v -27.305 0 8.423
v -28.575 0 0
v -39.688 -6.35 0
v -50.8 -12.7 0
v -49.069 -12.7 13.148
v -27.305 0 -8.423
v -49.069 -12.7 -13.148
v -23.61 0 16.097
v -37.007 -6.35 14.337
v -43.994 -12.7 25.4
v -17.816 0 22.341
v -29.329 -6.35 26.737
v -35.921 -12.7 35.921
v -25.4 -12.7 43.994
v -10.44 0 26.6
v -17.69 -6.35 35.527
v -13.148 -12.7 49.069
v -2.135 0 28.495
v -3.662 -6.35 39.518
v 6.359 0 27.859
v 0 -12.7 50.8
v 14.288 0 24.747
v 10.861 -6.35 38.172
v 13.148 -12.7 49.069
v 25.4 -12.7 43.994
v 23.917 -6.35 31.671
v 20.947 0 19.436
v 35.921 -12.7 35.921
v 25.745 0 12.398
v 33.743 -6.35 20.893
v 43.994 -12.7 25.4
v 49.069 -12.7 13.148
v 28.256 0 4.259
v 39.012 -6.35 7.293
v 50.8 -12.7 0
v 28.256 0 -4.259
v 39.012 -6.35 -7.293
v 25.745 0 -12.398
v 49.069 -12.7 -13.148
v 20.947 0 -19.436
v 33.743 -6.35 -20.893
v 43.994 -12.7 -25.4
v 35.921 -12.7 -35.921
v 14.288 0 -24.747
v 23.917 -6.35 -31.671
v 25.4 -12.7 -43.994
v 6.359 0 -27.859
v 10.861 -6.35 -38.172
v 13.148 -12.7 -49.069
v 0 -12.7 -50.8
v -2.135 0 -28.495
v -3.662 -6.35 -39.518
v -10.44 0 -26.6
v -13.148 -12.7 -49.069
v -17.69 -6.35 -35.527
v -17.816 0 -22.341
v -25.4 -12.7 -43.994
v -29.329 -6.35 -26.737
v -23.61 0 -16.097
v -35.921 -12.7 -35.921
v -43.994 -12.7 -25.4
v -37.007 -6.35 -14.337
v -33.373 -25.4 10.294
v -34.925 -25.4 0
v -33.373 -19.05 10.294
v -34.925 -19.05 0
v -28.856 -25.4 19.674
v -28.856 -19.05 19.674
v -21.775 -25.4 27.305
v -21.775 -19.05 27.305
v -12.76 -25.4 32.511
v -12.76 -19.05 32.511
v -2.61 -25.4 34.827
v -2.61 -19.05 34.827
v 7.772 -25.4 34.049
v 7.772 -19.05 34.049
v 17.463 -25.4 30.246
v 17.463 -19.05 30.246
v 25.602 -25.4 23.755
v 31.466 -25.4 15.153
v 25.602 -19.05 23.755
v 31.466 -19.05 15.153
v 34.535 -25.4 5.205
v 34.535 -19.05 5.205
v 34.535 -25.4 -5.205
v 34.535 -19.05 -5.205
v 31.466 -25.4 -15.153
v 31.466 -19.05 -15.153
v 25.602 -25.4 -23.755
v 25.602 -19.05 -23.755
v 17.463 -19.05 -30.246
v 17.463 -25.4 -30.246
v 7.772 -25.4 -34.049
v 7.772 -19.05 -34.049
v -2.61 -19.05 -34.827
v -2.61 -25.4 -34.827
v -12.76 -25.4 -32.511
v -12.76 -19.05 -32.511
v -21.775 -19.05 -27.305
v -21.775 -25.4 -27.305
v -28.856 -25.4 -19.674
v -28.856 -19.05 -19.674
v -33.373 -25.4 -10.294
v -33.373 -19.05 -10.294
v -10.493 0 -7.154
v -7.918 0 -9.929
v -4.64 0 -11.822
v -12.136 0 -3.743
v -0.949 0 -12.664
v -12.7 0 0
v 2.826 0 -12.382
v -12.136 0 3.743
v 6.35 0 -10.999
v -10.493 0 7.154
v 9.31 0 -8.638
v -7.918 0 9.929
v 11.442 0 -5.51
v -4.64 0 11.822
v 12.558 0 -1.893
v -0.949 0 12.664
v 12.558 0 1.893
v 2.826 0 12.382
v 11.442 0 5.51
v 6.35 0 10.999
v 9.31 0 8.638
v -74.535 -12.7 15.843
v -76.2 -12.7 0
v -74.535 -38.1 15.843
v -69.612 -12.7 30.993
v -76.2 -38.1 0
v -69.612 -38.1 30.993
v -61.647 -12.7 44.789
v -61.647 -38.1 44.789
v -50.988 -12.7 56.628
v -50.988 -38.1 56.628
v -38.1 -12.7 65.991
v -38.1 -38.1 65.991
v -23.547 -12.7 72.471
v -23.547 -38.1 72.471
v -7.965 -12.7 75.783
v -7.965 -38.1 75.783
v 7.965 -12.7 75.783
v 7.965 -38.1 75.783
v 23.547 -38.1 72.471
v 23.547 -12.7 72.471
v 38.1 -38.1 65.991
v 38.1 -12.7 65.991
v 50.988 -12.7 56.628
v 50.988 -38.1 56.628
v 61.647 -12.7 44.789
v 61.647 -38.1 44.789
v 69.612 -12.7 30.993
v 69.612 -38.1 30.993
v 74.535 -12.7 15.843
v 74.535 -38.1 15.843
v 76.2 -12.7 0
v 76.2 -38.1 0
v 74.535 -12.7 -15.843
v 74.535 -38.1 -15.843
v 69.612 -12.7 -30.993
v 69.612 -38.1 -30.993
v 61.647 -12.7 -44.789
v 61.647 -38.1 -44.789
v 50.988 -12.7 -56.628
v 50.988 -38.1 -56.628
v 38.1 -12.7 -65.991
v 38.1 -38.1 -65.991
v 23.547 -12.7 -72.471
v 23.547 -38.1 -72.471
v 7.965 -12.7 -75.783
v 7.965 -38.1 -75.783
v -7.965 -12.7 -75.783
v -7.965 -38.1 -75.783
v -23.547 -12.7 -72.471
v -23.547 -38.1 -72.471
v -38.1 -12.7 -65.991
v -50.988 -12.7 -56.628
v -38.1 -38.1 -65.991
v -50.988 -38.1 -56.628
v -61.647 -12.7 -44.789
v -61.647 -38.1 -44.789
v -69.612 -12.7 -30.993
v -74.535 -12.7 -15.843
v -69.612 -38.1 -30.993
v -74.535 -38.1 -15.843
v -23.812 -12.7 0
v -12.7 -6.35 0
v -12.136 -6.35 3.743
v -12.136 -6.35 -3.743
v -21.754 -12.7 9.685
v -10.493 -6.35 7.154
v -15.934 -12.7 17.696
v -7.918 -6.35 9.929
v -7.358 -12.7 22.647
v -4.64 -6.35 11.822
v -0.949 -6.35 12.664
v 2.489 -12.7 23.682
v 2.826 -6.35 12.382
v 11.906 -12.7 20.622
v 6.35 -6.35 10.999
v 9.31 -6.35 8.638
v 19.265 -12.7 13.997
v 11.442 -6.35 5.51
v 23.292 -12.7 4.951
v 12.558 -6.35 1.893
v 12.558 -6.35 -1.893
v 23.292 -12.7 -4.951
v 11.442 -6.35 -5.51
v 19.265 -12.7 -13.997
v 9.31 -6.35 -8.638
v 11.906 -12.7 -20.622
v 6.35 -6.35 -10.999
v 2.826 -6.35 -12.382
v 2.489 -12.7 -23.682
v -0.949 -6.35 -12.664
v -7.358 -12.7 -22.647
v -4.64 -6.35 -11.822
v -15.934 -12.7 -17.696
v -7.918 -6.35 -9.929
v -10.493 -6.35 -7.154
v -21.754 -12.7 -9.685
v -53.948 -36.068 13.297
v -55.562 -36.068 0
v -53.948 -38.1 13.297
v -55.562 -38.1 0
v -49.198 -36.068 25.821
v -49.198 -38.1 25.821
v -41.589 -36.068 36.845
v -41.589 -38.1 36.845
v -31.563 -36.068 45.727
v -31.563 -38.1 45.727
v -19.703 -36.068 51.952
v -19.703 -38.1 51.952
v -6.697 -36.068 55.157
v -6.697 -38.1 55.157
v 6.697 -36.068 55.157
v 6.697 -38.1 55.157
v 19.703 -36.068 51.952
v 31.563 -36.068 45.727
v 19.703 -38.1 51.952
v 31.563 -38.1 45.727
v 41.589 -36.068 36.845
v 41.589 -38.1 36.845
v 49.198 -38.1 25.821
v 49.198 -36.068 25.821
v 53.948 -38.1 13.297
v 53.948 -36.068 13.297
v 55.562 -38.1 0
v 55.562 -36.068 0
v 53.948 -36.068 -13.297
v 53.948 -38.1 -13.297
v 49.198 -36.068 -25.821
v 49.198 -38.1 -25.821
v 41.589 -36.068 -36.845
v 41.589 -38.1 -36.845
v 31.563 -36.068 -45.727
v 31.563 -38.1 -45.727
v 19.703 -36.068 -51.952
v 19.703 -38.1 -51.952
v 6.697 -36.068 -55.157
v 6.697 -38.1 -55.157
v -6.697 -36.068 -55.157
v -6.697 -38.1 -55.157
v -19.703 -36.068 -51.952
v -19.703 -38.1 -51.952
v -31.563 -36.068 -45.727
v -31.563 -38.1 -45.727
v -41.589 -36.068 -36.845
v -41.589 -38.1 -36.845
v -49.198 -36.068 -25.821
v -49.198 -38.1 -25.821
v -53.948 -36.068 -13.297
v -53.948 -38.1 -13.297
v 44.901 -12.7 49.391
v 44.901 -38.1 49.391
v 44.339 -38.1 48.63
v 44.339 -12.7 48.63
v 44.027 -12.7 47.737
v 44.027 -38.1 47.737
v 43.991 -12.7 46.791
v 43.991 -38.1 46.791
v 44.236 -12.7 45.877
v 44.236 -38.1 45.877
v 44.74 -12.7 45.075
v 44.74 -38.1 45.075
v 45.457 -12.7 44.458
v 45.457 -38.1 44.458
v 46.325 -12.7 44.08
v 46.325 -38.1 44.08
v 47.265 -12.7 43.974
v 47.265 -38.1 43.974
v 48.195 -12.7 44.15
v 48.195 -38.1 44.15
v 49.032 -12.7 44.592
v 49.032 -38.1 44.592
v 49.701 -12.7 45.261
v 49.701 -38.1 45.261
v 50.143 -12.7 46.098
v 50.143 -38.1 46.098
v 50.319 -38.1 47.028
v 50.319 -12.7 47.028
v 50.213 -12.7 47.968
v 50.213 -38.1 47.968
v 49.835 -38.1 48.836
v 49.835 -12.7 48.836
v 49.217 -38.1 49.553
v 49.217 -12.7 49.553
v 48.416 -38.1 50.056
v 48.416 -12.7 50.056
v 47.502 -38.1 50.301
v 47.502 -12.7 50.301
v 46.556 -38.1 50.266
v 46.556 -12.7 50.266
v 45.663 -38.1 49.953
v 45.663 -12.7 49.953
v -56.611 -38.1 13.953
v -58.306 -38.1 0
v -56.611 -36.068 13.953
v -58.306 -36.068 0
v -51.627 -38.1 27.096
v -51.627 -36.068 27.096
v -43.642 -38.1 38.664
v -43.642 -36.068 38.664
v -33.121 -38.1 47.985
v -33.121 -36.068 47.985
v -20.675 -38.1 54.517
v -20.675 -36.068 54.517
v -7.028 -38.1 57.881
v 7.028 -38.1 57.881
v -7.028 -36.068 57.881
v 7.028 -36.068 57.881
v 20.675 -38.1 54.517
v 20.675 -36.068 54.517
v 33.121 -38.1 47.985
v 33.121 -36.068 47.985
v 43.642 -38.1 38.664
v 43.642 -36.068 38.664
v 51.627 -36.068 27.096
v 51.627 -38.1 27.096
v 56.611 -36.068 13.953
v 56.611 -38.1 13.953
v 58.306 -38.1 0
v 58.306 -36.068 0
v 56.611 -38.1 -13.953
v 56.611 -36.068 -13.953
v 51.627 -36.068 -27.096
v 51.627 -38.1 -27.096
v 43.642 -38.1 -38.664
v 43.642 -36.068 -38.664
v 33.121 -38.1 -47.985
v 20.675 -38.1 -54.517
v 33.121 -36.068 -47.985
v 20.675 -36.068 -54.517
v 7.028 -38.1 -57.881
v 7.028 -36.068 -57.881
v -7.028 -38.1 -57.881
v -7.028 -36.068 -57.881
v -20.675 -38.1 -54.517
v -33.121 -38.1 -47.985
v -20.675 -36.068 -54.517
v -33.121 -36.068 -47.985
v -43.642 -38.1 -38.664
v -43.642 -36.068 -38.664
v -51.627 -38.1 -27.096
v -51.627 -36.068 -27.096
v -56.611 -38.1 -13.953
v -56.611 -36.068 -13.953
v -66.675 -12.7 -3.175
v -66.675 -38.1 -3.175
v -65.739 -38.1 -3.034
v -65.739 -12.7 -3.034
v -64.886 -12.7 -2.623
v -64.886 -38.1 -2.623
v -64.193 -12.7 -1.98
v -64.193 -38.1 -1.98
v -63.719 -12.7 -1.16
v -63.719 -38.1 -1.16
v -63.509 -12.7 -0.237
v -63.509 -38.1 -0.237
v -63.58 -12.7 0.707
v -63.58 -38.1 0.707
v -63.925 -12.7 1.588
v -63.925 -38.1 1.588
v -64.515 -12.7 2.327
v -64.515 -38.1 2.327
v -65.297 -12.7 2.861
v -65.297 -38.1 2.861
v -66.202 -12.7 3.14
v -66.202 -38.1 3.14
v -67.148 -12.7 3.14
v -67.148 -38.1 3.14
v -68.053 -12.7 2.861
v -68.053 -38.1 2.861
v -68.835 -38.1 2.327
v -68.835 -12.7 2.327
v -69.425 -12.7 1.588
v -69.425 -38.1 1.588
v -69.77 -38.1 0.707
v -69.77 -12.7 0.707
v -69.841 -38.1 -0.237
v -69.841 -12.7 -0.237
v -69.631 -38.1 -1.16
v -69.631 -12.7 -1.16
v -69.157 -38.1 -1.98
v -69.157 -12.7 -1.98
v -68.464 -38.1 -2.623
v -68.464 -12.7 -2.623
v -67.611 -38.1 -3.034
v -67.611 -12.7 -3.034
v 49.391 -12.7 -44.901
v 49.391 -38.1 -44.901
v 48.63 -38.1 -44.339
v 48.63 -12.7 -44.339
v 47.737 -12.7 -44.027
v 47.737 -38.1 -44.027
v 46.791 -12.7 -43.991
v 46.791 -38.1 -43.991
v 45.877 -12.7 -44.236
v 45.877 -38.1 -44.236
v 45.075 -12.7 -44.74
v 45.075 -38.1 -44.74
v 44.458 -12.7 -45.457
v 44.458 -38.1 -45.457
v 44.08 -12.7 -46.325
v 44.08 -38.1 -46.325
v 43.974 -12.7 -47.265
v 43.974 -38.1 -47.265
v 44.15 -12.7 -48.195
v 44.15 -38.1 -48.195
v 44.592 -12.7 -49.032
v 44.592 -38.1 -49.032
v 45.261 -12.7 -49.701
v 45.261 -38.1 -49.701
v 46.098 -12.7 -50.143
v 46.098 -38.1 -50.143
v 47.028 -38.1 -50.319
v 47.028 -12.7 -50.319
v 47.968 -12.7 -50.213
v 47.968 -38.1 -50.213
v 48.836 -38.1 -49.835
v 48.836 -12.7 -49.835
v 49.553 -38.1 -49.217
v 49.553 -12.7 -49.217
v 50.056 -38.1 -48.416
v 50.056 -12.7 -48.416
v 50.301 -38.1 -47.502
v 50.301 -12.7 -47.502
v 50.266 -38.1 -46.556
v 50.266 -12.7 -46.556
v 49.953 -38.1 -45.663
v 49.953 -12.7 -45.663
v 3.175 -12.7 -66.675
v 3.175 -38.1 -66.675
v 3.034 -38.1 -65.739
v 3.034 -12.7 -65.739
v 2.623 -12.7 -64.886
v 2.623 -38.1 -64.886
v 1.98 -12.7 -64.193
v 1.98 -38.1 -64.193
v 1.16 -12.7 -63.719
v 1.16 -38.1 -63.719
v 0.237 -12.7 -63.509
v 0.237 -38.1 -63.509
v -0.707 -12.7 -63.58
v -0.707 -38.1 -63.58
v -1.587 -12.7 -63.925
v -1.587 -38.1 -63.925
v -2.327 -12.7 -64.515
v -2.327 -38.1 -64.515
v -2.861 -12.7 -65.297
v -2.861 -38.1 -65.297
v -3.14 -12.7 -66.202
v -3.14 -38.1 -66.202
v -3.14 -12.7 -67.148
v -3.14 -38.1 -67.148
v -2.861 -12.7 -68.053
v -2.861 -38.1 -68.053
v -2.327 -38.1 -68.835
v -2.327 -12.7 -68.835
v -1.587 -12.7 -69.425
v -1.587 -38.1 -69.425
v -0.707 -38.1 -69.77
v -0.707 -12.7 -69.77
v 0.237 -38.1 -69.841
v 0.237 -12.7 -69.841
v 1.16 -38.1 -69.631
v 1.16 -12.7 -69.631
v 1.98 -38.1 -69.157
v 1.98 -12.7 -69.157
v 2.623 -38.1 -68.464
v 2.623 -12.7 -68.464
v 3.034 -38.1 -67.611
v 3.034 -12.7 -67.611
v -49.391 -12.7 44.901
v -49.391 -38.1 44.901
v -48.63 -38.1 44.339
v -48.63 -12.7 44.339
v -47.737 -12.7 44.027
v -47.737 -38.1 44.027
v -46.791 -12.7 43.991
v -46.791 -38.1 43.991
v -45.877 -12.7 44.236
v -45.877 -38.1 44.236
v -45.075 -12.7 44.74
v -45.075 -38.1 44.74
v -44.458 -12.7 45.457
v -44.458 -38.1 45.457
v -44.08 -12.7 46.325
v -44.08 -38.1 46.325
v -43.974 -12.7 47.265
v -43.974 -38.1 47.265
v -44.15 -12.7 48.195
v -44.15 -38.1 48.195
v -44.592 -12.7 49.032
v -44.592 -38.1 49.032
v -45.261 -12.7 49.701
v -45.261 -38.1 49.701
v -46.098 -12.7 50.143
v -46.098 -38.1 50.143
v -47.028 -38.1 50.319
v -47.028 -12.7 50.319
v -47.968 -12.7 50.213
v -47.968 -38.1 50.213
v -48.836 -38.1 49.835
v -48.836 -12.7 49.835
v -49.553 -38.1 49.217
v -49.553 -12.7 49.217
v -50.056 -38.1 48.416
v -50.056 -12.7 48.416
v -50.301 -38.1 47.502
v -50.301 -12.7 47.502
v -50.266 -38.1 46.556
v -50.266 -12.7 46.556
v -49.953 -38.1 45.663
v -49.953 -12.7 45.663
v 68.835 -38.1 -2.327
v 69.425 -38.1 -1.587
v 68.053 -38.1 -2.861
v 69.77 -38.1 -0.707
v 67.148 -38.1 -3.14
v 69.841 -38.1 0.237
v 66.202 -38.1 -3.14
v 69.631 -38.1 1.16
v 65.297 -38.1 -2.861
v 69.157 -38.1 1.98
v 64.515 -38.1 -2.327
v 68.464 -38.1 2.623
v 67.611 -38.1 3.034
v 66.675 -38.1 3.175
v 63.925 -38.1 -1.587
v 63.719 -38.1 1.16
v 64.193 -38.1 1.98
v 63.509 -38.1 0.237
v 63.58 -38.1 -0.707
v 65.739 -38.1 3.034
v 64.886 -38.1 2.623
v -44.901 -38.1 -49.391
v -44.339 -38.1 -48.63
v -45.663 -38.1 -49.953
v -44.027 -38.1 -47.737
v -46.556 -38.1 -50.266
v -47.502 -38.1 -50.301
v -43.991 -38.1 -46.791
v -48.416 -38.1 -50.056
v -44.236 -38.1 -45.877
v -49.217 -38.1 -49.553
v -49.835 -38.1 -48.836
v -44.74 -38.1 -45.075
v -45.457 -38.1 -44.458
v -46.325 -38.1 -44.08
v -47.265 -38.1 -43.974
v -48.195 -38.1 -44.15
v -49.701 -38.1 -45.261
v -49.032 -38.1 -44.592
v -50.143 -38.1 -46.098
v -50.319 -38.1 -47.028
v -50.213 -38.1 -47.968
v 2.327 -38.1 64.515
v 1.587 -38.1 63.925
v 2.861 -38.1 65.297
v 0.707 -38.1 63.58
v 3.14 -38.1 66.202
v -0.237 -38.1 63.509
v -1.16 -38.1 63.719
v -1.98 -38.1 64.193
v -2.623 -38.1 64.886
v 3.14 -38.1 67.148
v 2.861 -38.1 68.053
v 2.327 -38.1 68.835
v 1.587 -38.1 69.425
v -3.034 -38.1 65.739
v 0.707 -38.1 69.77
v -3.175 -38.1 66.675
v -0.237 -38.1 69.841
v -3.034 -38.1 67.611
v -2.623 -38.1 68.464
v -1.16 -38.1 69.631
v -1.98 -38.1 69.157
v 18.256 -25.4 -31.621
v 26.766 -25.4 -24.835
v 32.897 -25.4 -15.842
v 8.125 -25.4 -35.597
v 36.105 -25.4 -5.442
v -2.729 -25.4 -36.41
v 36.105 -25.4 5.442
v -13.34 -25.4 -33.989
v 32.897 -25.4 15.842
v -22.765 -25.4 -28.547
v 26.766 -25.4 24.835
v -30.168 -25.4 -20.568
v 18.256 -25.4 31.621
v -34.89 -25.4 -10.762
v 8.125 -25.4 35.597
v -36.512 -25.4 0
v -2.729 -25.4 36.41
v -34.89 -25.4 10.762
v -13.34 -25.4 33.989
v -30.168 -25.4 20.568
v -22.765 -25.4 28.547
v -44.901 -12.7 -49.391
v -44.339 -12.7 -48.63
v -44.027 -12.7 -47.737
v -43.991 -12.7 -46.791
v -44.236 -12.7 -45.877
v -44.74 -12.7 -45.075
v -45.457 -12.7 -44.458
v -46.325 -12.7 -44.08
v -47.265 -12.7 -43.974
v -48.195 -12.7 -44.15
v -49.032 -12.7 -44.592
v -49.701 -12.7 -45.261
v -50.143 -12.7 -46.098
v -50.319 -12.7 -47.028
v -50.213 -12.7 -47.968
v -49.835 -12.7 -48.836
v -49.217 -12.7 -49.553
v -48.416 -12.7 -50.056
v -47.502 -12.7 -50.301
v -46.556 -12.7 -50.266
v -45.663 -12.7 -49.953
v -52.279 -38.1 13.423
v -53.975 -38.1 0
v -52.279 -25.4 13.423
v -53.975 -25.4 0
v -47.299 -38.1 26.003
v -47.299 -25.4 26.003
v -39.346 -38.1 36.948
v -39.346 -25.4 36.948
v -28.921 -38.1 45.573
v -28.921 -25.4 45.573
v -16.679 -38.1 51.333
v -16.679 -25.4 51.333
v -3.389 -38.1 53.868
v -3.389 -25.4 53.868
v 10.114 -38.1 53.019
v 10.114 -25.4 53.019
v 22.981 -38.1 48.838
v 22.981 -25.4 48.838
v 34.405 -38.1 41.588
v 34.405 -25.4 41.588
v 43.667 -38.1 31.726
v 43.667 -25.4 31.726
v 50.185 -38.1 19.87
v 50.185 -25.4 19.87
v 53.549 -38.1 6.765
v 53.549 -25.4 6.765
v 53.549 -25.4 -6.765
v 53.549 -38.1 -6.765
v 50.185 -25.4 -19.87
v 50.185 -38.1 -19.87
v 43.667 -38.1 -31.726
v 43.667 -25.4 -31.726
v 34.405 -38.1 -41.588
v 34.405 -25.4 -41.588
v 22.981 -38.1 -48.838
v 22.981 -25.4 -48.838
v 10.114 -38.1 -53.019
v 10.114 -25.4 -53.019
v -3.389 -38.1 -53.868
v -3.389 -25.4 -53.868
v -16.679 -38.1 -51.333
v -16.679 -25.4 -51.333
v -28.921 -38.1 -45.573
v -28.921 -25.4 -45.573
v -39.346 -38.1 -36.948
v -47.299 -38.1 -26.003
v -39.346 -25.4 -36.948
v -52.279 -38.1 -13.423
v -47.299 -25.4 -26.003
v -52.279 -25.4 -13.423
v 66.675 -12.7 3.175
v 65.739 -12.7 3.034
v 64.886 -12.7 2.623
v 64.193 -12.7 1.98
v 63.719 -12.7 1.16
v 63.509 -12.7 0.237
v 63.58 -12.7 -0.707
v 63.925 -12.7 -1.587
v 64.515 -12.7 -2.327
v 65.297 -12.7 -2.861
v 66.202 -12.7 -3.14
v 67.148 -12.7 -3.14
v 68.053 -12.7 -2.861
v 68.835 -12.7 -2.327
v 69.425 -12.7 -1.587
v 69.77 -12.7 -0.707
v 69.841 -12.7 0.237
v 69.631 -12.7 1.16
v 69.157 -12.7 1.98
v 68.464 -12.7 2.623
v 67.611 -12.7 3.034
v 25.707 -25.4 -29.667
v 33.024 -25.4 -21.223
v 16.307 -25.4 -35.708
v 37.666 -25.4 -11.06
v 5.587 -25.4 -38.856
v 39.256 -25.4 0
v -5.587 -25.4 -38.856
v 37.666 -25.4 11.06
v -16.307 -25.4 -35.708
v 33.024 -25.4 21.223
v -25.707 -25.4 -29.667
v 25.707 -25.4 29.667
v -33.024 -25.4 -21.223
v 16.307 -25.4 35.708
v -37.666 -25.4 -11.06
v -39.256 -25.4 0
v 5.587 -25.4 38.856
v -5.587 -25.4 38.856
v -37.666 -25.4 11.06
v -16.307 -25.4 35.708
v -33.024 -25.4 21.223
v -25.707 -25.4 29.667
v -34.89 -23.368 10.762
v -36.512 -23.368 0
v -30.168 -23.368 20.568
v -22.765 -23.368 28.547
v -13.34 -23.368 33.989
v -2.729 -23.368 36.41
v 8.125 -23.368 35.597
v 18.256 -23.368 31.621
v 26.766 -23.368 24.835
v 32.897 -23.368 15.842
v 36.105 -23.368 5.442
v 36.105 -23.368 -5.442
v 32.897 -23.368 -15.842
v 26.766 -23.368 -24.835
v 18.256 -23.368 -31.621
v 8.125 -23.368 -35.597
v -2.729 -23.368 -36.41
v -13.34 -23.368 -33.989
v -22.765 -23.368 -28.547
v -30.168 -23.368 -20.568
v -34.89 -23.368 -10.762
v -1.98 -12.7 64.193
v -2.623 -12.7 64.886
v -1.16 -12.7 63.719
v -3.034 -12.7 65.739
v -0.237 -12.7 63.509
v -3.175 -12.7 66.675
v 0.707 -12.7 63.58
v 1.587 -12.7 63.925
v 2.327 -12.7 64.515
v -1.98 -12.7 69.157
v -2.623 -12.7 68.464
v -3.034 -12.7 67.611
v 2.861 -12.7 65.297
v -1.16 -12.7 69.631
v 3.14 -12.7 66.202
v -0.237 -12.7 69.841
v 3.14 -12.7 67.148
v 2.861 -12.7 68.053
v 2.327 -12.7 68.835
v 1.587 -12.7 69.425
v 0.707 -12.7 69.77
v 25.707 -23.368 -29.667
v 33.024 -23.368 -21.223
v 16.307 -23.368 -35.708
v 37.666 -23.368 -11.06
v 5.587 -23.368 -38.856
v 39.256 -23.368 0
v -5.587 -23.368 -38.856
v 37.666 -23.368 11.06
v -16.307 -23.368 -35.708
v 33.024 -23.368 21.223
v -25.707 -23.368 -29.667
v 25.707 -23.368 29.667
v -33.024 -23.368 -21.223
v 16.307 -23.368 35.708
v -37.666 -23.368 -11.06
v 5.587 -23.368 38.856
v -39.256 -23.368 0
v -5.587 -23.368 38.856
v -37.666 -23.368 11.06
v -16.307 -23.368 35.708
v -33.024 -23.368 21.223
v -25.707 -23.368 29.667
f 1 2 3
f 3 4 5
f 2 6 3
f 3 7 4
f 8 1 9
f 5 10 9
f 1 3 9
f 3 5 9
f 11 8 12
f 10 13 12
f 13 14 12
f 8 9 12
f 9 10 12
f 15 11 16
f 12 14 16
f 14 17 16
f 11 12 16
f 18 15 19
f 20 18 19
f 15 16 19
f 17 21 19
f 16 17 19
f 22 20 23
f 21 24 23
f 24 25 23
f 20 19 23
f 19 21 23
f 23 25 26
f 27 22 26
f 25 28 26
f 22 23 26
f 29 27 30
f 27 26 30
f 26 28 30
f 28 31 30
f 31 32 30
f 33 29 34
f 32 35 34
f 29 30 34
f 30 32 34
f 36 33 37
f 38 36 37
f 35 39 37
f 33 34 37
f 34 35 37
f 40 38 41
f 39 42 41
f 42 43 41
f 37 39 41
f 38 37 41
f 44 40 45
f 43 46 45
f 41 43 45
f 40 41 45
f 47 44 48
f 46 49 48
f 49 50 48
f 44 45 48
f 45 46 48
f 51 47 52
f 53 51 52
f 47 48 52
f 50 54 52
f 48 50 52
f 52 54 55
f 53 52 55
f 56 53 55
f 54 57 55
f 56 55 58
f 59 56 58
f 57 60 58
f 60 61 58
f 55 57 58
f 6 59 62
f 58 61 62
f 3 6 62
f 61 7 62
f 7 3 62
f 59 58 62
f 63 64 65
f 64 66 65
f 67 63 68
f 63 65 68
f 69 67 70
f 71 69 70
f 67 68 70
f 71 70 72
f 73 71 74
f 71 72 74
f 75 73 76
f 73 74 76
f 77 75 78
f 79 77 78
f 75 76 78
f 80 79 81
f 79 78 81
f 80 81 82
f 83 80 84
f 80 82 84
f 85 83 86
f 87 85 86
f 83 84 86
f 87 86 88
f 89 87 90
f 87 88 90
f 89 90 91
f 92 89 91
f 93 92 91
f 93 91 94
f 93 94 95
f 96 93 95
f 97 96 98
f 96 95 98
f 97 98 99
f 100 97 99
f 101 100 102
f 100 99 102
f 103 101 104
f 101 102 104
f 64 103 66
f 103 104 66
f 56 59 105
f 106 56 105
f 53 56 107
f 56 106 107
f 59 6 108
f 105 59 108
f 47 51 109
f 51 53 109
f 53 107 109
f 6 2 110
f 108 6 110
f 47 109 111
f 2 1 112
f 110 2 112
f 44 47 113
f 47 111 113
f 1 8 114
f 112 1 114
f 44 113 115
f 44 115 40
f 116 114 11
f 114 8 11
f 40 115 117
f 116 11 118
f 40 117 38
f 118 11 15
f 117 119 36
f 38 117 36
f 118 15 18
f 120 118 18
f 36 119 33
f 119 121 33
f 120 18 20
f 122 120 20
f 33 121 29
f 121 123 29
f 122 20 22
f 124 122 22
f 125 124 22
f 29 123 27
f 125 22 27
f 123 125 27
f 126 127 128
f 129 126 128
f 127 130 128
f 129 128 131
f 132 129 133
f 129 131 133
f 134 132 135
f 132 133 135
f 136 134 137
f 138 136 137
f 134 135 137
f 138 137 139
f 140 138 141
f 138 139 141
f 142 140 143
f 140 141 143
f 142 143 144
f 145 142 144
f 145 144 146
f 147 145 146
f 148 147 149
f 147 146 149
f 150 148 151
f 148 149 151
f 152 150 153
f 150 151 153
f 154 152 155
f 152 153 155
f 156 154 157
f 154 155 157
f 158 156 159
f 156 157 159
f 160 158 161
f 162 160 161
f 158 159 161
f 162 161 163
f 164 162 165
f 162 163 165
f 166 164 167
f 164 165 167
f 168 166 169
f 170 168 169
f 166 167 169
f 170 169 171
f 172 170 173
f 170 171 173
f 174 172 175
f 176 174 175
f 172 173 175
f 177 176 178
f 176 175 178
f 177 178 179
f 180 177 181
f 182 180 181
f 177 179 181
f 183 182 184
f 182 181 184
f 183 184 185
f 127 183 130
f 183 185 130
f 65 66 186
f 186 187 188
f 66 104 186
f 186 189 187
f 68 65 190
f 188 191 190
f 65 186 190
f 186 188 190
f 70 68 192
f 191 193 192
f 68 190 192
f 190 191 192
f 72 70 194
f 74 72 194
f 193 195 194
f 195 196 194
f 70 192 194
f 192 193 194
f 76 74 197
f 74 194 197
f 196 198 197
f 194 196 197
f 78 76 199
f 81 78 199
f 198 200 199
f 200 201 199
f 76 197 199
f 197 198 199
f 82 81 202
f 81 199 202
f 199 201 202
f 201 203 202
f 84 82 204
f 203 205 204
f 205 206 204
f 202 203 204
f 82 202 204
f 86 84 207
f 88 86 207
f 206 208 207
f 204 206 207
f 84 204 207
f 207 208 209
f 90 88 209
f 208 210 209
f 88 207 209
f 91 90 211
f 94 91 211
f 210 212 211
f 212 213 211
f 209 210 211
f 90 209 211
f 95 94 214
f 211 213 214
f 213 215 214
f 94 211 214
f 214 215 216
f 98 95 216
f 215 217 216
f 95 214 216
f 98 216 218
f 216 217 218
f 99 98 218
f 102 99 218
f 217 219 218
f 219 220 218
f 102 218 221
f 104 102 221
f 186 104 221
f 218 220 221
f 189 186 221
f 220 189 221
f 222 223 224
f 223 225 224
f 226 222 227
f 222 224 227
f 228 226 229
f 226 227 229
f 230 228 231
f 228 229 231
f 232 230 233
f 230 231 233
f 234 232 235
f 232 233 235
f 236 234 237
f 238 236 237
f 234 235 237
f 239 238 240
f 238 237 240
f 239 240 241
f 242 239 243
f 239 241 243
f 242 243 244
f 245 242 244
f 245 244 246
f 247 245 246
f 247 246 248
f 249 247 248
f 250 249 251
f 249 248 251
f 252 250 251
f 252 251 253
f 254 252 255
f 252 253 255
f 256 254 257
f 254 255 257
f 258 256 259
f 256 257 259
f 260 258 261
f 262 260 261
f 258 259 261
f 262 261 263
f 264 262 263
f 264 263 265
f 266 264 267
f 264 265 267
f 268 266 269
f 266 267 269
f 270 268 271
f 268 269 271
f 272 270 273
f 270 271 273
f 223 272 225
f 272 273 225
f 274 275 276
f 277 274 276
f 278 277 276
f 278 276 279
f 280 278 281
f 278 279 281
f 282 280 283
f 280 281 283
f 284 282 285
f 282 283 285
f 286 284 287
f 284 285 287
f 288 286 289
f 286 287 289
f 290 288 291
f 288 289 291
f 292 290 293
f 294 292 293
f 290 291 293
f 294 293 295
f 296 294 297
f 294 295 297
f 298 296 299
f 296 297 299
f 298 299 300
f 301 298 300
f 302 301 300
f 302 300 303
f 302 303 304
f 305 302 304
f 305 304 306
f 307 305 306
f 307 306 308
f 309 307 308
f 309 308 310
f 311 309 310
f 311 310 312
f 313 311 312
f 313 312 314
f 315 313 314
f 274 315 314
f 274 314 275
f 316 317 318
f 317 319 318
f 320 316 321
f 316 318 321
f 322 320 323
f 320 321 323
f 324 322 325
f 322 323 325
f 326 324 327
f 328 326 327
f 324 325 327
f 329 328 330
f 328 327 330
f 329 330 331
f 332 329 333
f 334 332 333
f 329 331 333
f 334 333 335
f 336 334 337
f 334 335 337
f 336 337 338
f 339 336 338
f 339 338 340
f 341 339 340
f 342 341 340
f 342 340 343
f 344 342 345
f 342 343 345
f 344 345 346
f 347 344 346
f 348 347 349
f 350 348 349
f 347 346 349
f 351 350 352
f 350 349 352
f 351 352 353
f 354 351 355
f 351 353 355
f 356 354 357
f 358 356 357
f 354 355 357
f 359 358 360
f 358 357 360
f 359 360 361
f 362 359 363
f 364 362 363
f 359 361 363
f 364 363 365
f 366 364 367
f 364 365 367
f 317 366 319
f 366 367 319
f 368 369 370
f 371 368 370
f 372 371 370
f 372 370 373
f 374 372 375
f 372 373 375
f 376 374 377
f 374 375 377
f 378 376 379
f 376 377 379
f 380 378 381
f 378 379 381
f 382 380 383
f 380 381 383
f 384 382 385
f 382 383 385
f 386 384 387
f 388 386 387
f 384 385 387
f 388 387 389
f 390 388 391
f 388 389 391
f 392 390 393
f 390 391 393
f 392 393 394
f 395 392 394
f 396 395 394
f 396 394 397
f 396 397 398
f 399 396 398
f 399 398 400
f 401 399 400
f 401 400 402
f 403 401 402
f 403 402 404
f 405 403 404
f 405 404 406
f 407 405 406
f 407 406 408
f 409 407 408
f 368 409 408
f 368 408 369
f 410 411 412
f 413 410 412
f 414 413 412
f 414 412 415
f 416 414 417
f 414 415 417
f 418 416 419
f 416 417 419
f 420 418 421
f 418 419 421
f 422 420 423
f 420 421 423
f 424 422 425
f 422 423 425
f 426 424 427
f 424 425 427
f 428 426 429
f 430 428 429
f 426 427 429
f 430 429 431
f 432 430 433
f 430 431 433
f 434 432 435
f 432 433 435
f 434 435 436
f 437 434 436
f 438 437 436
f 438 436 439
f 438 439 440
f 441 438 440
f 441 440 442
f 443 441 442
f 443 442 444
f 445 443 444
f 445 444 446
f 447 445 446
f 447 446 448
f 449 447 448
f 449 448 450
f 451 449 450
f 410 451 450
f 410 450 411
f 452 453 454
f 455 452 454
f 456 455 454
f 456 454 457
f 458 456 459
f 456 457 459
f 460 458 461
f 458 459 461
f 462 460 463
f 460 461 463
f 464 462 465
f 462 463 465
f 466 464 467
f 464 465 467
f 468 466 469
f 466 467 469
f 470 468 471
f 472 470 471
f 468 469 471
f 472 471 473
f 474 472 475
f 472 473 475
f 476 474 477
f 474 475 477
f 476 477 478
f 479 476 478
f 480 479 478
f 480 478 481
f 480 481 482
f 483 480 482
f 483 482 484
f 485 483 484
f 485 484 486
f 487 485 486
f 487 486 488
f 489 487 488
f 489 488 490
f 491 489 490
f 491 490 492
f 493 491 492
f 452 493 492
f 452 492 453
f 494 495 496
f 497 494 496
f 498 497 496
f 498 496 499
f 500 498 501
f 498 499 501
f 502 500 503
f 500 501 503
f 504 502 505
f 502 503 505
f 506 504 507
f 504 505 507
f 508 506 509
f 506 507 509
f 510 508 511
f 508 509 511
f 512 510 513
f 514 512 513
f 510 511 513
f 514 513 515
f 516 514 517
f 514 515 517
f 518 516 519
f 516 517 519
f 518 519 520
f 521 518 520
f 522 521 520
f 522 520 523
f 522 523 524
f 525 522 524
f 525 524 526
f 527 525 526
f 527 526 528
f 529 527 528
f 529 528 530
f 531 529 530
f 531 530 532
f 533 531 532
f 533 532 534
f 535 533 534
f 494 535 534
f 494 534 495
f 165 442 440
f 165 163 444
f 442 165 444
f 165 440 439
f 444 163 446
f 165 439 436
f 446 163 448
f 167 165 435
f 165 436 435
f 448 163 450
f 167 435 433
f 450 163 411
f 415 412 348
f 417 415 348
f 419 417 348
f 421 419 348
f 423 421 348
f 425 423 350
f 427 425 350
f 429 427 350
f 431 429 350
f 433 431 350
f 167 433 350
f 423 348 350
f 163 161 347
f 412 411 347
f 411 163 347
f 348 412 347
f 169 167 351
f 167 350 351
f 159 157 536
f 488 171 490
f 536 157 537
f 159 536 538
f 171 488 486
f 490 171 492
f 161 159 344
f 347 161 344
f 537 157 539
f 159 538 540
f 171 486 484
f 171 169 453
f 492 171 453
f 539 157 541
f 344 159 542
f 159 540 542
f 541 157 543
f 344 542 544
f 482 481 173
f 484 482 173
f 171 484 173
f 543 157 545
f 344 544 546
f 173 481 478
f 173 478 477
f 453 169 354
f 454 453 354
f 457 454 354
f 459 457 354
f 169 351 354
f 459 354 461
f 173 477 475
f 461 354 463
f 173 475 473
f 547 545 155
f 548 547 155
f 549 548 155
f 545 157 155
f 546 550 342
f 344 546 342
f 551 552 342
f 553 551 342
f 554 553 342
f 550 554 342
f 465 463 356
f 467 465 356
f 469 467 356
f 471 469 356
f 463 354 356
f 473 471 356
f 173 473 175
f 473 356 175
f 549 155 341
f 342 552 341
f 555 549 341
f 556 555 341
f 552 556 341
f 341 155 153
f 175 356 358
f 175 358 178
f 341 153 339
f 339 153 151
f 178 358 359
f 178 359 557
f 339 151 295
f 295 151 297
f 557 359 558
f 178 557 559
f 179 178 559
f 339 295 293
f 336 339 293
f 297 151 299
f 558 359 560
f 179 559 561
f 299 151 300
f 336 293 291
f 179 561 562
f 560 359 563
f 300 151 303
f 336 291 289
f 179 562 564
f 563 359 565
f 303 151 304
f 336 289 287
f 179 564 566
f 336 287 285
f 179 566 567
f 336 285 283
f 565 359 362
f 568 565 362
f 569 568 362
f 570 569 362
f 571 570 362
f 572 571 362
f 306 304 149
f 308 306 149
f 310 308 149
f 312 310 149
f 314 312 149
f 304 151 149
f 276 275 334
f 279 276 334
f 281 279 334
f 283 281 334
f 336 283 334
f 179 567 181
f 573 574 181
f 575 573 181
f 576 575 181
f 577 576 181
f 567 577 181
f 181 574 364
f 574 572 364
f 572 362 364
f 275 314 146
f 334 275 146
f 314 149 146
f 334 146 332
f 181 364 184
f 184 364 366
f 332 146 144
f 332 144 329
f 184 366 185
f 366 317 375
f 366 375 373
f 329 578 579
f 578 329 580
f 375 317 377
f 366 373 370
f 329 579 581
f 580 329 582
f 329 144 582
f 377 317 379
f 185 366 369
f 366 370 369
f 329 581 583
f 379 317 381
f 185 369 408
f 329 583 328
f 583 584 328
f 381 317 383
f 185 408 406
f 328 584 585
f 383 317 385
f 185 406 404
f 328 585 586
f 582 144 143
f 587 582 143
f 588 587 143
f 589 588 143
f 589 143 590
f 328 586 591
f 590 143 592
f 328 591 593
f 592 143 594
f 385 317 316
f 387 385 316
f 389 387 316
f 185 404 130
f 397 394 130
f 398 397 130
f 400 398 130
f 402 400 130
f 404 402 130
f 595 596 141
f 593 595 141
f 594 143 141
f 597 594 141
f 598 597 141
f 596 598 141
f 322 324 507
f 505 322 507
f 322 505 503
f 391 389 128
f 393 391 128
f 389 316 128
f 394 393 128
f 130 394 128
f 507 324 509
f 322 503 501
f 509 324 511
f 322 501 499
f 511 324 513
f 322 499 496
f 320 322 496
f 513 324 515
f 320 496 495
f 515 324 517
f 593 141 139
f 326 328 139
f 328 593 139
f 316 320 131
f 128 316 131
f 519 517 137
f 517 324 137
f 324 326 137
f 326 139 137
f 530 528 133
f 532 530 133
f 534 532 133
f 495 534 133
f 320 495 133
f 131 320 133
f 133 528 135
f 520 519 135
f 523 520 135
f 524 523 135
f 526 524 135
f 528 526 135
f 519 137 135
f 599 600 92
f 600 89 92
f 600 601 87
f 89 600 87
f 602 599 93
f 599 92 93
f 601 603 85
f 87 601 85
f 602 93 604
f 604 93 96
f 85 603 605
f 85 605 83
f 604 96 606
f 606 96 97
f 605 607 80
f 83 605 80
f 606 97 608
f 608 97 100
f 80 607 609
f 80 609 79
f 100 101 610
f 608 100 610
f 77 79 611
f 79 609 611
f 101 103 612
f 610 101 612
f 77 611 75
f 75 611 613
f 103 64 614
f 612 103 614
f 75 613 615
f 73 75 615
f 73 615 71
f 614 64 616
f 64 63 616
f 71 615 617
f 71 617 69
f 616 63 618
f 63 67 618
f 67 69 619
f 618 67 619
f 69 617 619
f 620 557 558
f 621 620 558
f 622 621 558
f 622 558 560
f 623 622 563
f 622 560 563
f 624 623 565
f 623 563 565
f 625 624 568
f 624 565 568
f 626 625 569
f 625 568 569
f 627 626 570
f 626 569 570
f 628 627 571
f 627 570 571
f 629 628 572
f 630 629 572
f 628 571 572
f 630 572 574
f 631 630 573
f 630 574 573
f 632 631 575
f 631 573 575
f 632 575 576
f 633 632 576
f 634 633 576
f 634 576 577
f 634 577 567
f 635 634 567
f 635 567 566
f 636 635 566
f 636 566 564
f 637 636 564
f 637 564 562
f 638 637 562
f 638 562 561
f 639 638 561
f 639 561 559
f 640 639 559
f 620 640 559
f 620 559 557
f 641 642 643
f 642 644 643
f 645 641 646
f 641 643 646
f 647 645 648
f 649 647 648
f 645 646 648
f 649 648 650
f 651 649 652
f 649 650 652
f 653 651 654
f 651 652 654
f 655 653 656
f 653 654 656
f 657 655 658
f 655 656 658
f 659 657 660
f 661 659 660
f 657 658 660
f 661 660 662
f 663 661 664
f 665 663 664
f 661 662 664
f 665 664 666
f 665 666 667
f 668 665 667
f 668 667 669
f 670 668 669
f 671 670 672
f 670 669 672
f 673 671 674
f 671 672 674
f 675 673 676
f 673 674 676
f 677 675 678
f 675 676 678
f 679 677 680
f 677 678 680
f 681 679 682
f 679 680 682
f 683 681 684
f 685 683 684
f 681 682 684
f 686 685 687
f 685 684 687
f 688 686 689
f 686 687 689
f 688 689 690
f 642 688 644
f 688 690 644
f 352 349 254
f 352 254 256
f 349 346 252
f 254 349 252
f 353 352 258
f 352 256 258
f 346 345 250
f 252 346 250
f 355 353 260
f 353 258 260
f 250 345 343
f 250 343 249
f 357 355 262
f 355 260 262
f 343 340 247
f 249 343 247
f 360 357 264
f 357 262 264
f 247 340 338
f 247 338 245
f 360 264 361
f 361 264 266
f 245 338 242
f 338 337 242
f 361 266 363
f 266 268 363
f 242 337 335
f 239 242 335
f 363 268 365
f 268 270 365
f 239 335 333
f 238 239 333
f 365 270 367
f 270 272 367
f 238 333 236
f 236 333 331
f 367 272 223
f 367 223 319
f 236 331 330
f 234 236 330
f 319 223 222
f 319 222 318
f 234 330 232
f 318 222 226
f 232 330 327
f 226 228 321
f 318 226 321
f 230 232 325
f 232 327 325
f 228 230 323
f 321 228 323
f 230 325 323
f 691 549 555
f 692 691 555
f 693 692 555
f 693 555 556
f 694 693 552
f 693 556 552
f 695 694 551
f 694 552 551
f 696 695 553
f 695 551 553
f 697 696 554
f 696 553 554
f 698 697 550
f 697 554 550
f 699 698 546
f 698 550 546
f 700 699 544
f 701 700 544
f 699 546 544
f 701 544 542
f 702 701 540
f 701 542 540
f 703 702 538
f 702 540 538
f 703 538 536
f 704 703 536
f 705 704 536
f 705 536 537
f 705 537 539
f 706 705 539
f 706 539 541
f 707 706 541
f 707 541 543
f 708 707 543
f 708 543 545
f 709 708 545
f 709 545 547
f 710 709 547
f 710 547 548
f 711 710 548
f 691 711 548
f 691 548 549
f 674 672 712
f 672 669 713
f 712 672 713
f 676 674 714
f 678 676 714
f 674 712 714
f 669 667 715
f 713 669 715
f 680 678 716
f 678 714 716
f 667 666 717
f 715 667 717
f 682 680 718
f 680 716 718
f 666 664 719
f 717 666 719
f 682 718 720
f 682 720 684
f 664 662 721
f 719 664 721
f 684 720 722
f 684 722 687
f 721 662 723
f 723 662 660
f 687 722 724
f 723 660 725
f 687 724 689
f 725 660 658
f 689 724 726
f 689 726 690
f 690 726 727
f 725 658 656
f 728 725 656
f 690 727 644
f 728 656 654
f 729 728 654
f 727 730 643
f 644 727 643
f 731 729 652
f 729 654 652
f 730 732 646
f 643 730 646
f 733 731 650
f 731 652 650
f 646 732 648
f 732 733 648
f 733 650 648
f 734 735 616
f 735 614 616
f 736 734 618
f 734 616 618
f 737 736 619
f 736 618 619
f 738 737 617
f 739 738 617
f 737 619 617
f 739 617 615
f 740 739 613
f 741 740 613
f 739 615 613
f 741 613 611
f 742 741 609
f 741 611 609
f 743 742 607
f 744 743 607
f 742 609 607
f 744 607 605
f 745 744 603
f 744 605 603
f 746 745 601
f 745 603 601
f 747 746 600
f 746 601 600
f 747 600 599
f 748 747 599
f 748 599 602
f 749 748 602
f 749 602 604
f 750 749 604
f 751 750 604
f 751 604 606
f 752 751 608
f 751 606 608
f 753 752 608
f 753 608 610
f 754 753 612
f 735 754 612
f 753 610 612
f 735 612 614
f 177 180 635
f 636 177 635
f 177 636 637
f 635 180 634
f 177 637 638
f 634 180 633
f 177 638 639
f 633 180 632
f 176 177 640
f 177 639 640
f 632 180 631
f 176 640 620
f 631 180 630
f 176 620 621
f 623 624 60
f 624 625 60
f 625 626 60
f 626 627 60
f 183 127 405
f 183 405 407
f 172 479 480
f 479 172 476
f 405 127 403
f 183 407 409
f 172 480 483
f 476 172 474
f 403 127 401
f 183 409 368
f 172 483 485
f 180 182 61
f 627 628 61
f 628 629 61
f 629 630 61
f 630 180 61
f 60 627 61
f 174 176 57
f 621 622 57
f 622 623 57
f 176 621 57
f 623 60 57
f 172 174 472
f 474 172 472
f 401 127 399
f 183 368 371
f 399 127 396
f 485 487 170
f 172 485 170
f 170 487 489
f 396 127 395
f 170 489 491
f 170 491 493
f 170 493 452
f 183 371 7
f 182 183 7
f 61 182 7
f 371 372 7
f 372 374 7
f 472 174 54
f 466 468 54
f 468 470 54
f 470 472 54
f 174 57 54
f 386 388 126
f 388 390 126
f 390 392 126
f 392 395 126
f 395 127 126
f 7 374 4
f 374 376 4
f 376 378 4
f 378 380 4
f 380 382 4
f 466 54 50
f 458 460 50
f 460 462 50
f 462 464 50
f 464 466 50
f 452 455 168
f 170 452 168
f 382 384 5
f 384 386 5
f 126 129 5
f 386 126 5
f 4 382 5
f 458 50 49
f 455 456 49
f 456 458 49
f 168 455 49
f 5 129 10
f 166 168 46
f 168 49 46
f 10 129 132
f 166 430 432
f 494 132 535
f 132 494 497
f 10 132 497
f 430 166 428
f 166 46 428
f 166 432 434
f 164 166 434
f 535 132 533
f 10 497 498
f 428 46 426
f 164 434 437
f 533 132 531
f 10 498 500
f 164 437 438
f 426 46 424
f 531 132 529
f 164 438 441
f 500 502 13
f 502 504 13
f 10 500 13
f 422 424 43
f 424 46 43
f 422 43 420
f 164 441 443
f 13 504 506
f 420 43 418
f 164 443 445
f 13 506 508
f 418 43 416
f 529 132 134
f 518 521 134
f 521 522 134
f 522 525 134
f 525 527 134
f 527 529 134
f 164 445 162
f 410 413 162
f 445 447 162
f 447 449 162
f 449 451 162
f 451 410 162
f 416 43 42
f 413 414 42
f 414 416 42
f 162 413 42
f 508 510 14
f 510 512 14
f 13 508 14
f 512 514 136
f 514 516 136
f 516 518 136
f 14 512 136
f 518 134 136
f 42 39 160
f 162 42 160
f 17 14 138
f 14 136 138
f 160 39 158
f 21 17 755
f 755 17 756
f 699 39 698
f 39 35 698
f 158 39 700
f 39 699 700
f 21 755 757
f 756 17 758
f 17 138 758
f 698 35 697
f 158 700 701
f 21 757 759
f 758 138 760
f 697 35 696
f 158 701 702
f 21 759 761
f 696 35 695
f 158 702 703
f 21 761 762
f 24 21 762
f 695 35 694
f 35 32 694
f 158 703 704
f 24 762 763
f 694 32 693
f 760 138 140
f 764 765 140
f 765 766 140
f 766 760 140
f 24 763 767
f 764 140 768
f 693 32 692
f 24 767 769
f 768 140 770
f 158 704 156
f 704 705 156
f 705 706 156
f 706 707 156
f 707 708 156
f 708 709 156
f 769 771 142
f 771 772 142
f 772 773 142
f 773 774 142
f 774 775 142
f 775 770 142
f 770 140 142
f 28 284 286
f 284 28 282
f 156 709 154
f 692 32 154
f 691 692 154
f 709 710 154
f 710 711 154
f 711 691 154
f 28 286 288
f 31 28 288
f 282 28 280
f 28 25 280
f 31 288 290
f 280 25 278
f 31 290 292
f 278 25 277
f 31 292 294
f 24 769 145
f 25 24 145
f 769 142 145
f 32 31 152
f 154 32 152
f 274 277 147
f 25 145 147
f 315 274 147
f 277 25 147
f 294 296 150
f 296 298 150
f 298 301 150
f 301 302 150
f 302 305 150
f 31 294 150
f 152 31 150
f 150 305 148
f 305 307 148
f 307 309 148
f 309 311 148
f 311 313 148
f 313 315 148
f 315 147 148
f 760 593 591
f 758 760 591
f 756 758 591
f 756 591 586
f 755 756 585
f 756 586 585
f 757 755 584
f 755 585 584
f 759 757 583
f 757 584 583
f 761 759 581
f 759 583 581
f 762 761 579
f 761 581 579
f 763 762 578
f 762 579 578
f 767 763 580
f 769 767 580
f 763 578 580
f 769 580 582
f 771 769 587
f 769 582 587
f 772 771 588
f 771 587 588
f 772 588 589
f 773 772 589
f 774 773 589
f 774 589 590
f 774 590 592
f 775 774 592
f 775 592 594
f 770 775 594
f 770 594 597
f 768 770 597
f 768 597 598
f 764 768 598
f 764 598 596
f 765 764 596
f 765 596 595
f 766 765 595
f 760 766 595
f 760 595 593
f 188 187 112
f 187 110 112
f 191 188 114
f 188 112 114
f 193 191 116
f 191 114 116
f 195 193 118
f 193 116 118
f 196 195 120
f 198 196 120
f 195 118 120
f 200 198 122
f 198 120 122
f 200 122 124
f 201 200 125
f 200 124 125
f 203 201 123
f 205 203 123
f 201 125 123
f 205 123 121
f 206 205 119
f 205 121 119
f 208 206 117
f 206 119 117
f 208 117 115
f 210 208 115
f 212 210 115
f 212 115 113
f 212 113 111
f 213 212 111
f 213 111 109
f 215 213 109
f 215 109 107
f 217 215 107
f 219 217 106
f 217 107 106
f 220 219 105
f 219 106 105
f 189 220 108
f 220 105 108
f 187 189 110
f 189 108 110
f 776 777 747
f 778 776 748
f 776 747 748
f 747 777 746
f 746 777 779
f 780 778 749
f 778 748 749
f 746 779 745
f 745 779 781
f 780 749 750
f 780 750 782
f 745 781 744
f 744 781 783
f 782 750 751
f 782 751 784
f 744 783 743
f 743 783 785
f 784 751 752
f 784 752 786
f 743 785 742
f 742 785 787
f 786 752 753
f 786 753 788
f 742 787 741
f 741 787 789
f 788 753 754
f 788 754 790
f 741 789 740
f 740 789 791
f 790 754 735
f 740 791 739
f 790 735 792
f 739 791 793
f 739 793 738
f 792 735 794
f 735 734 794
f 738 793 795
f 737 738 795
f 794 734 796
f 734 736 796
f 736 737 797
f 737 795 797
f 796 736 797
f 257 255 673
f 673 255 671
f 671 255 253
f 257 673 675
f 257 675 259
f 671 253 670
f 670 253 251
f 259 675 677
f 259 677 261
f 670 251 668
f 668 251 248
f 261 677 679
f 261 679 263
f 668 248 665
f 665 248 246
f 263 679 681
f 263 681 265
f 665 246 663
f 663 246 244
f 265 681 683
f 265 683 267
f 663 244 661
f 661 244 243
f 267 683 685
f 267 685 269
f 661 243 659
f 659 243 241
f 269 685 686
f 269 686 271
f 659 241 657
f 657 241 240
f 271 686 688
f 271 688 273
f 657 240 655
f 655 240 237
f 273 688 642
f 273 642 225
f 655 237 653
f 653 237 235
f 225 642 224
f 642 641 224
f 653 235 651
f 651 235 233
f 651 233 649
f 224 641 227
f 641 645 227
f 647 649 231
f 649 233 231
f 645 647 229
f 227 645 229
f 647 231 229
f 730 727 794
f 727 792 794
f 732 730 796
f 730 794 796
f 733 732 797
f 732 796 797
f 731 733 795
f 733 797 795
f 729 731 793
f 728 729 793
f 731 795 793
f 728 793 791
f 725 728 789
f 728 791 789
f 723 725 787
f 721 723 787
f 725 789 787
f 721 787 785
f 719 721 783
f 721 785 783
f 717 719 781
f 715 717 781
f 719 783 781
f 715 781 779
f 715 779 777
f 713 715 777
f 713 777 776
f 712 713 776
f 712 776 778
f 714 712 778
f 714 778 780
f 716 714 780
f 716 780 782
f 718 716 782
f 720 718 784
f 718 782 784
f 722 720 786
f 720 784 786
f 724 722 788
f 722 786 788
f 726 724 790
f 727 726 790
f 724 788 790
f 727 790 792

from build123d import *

# Parameters (mm, degrees)
F_1_4_0_25_DIAMETER_HOLE1_D = 6.35
CIRPATTERN1_COUNT           = 8


with BuildPart() as part:
    # Sketch1 → Revolve1 (revolve)
    with BuildSketch(Plane.XY):
        Polygon((-12.7, 0), (-28.575, 0), (-50.8, -12.7), (-76.2, -12.7), (-76.2, -38.1), (-58.3057, -38.1), (-58.3057, -36.068), (-55.5625, -36.068), (-55.5625, -38.1), (-53.975, -38.1), (-53.975, -25.4), (-39.2557, -25.4), (-39.2557, -23.368), (-36.5125, -23.368), (-36.5125, -25.4), (-34.925, -25.4), (-34.925, -19.05), (-12.7, -6.35), align=None)
    revolve(axis=Axis((0, 0, 0), (0, 1, 0)))

    # 1/4 (0.25) Diameter Hole1 (through all)
    with Locations(Plane(origin=(-66.675, 0, 0), x_dir=(0, 0, 1), z_dir=(0, 1, 0))):
        with Locations((0, 0)):
            f_1_4_0_25_diameter_hole1 = Hole(F_1_4_0_25_DIAMETER_HOLE1_D / 2)

    # CirPattern1: 1/4 (0.25) Diameter Hole1 ×8 about axis
    cirpattern1_axis = Axis((0, 35.95, 0), (0, -1, 0))
    for i in range(1, CIRPATTERN1_COUNT):
        add(f_1_4_0_25_diameter_hole1.rotate(cirpattern1_axis, i * 360 / CIRPATTERN1_COUNT), mode=Mode.SUBTRACT)


solid = part.part
